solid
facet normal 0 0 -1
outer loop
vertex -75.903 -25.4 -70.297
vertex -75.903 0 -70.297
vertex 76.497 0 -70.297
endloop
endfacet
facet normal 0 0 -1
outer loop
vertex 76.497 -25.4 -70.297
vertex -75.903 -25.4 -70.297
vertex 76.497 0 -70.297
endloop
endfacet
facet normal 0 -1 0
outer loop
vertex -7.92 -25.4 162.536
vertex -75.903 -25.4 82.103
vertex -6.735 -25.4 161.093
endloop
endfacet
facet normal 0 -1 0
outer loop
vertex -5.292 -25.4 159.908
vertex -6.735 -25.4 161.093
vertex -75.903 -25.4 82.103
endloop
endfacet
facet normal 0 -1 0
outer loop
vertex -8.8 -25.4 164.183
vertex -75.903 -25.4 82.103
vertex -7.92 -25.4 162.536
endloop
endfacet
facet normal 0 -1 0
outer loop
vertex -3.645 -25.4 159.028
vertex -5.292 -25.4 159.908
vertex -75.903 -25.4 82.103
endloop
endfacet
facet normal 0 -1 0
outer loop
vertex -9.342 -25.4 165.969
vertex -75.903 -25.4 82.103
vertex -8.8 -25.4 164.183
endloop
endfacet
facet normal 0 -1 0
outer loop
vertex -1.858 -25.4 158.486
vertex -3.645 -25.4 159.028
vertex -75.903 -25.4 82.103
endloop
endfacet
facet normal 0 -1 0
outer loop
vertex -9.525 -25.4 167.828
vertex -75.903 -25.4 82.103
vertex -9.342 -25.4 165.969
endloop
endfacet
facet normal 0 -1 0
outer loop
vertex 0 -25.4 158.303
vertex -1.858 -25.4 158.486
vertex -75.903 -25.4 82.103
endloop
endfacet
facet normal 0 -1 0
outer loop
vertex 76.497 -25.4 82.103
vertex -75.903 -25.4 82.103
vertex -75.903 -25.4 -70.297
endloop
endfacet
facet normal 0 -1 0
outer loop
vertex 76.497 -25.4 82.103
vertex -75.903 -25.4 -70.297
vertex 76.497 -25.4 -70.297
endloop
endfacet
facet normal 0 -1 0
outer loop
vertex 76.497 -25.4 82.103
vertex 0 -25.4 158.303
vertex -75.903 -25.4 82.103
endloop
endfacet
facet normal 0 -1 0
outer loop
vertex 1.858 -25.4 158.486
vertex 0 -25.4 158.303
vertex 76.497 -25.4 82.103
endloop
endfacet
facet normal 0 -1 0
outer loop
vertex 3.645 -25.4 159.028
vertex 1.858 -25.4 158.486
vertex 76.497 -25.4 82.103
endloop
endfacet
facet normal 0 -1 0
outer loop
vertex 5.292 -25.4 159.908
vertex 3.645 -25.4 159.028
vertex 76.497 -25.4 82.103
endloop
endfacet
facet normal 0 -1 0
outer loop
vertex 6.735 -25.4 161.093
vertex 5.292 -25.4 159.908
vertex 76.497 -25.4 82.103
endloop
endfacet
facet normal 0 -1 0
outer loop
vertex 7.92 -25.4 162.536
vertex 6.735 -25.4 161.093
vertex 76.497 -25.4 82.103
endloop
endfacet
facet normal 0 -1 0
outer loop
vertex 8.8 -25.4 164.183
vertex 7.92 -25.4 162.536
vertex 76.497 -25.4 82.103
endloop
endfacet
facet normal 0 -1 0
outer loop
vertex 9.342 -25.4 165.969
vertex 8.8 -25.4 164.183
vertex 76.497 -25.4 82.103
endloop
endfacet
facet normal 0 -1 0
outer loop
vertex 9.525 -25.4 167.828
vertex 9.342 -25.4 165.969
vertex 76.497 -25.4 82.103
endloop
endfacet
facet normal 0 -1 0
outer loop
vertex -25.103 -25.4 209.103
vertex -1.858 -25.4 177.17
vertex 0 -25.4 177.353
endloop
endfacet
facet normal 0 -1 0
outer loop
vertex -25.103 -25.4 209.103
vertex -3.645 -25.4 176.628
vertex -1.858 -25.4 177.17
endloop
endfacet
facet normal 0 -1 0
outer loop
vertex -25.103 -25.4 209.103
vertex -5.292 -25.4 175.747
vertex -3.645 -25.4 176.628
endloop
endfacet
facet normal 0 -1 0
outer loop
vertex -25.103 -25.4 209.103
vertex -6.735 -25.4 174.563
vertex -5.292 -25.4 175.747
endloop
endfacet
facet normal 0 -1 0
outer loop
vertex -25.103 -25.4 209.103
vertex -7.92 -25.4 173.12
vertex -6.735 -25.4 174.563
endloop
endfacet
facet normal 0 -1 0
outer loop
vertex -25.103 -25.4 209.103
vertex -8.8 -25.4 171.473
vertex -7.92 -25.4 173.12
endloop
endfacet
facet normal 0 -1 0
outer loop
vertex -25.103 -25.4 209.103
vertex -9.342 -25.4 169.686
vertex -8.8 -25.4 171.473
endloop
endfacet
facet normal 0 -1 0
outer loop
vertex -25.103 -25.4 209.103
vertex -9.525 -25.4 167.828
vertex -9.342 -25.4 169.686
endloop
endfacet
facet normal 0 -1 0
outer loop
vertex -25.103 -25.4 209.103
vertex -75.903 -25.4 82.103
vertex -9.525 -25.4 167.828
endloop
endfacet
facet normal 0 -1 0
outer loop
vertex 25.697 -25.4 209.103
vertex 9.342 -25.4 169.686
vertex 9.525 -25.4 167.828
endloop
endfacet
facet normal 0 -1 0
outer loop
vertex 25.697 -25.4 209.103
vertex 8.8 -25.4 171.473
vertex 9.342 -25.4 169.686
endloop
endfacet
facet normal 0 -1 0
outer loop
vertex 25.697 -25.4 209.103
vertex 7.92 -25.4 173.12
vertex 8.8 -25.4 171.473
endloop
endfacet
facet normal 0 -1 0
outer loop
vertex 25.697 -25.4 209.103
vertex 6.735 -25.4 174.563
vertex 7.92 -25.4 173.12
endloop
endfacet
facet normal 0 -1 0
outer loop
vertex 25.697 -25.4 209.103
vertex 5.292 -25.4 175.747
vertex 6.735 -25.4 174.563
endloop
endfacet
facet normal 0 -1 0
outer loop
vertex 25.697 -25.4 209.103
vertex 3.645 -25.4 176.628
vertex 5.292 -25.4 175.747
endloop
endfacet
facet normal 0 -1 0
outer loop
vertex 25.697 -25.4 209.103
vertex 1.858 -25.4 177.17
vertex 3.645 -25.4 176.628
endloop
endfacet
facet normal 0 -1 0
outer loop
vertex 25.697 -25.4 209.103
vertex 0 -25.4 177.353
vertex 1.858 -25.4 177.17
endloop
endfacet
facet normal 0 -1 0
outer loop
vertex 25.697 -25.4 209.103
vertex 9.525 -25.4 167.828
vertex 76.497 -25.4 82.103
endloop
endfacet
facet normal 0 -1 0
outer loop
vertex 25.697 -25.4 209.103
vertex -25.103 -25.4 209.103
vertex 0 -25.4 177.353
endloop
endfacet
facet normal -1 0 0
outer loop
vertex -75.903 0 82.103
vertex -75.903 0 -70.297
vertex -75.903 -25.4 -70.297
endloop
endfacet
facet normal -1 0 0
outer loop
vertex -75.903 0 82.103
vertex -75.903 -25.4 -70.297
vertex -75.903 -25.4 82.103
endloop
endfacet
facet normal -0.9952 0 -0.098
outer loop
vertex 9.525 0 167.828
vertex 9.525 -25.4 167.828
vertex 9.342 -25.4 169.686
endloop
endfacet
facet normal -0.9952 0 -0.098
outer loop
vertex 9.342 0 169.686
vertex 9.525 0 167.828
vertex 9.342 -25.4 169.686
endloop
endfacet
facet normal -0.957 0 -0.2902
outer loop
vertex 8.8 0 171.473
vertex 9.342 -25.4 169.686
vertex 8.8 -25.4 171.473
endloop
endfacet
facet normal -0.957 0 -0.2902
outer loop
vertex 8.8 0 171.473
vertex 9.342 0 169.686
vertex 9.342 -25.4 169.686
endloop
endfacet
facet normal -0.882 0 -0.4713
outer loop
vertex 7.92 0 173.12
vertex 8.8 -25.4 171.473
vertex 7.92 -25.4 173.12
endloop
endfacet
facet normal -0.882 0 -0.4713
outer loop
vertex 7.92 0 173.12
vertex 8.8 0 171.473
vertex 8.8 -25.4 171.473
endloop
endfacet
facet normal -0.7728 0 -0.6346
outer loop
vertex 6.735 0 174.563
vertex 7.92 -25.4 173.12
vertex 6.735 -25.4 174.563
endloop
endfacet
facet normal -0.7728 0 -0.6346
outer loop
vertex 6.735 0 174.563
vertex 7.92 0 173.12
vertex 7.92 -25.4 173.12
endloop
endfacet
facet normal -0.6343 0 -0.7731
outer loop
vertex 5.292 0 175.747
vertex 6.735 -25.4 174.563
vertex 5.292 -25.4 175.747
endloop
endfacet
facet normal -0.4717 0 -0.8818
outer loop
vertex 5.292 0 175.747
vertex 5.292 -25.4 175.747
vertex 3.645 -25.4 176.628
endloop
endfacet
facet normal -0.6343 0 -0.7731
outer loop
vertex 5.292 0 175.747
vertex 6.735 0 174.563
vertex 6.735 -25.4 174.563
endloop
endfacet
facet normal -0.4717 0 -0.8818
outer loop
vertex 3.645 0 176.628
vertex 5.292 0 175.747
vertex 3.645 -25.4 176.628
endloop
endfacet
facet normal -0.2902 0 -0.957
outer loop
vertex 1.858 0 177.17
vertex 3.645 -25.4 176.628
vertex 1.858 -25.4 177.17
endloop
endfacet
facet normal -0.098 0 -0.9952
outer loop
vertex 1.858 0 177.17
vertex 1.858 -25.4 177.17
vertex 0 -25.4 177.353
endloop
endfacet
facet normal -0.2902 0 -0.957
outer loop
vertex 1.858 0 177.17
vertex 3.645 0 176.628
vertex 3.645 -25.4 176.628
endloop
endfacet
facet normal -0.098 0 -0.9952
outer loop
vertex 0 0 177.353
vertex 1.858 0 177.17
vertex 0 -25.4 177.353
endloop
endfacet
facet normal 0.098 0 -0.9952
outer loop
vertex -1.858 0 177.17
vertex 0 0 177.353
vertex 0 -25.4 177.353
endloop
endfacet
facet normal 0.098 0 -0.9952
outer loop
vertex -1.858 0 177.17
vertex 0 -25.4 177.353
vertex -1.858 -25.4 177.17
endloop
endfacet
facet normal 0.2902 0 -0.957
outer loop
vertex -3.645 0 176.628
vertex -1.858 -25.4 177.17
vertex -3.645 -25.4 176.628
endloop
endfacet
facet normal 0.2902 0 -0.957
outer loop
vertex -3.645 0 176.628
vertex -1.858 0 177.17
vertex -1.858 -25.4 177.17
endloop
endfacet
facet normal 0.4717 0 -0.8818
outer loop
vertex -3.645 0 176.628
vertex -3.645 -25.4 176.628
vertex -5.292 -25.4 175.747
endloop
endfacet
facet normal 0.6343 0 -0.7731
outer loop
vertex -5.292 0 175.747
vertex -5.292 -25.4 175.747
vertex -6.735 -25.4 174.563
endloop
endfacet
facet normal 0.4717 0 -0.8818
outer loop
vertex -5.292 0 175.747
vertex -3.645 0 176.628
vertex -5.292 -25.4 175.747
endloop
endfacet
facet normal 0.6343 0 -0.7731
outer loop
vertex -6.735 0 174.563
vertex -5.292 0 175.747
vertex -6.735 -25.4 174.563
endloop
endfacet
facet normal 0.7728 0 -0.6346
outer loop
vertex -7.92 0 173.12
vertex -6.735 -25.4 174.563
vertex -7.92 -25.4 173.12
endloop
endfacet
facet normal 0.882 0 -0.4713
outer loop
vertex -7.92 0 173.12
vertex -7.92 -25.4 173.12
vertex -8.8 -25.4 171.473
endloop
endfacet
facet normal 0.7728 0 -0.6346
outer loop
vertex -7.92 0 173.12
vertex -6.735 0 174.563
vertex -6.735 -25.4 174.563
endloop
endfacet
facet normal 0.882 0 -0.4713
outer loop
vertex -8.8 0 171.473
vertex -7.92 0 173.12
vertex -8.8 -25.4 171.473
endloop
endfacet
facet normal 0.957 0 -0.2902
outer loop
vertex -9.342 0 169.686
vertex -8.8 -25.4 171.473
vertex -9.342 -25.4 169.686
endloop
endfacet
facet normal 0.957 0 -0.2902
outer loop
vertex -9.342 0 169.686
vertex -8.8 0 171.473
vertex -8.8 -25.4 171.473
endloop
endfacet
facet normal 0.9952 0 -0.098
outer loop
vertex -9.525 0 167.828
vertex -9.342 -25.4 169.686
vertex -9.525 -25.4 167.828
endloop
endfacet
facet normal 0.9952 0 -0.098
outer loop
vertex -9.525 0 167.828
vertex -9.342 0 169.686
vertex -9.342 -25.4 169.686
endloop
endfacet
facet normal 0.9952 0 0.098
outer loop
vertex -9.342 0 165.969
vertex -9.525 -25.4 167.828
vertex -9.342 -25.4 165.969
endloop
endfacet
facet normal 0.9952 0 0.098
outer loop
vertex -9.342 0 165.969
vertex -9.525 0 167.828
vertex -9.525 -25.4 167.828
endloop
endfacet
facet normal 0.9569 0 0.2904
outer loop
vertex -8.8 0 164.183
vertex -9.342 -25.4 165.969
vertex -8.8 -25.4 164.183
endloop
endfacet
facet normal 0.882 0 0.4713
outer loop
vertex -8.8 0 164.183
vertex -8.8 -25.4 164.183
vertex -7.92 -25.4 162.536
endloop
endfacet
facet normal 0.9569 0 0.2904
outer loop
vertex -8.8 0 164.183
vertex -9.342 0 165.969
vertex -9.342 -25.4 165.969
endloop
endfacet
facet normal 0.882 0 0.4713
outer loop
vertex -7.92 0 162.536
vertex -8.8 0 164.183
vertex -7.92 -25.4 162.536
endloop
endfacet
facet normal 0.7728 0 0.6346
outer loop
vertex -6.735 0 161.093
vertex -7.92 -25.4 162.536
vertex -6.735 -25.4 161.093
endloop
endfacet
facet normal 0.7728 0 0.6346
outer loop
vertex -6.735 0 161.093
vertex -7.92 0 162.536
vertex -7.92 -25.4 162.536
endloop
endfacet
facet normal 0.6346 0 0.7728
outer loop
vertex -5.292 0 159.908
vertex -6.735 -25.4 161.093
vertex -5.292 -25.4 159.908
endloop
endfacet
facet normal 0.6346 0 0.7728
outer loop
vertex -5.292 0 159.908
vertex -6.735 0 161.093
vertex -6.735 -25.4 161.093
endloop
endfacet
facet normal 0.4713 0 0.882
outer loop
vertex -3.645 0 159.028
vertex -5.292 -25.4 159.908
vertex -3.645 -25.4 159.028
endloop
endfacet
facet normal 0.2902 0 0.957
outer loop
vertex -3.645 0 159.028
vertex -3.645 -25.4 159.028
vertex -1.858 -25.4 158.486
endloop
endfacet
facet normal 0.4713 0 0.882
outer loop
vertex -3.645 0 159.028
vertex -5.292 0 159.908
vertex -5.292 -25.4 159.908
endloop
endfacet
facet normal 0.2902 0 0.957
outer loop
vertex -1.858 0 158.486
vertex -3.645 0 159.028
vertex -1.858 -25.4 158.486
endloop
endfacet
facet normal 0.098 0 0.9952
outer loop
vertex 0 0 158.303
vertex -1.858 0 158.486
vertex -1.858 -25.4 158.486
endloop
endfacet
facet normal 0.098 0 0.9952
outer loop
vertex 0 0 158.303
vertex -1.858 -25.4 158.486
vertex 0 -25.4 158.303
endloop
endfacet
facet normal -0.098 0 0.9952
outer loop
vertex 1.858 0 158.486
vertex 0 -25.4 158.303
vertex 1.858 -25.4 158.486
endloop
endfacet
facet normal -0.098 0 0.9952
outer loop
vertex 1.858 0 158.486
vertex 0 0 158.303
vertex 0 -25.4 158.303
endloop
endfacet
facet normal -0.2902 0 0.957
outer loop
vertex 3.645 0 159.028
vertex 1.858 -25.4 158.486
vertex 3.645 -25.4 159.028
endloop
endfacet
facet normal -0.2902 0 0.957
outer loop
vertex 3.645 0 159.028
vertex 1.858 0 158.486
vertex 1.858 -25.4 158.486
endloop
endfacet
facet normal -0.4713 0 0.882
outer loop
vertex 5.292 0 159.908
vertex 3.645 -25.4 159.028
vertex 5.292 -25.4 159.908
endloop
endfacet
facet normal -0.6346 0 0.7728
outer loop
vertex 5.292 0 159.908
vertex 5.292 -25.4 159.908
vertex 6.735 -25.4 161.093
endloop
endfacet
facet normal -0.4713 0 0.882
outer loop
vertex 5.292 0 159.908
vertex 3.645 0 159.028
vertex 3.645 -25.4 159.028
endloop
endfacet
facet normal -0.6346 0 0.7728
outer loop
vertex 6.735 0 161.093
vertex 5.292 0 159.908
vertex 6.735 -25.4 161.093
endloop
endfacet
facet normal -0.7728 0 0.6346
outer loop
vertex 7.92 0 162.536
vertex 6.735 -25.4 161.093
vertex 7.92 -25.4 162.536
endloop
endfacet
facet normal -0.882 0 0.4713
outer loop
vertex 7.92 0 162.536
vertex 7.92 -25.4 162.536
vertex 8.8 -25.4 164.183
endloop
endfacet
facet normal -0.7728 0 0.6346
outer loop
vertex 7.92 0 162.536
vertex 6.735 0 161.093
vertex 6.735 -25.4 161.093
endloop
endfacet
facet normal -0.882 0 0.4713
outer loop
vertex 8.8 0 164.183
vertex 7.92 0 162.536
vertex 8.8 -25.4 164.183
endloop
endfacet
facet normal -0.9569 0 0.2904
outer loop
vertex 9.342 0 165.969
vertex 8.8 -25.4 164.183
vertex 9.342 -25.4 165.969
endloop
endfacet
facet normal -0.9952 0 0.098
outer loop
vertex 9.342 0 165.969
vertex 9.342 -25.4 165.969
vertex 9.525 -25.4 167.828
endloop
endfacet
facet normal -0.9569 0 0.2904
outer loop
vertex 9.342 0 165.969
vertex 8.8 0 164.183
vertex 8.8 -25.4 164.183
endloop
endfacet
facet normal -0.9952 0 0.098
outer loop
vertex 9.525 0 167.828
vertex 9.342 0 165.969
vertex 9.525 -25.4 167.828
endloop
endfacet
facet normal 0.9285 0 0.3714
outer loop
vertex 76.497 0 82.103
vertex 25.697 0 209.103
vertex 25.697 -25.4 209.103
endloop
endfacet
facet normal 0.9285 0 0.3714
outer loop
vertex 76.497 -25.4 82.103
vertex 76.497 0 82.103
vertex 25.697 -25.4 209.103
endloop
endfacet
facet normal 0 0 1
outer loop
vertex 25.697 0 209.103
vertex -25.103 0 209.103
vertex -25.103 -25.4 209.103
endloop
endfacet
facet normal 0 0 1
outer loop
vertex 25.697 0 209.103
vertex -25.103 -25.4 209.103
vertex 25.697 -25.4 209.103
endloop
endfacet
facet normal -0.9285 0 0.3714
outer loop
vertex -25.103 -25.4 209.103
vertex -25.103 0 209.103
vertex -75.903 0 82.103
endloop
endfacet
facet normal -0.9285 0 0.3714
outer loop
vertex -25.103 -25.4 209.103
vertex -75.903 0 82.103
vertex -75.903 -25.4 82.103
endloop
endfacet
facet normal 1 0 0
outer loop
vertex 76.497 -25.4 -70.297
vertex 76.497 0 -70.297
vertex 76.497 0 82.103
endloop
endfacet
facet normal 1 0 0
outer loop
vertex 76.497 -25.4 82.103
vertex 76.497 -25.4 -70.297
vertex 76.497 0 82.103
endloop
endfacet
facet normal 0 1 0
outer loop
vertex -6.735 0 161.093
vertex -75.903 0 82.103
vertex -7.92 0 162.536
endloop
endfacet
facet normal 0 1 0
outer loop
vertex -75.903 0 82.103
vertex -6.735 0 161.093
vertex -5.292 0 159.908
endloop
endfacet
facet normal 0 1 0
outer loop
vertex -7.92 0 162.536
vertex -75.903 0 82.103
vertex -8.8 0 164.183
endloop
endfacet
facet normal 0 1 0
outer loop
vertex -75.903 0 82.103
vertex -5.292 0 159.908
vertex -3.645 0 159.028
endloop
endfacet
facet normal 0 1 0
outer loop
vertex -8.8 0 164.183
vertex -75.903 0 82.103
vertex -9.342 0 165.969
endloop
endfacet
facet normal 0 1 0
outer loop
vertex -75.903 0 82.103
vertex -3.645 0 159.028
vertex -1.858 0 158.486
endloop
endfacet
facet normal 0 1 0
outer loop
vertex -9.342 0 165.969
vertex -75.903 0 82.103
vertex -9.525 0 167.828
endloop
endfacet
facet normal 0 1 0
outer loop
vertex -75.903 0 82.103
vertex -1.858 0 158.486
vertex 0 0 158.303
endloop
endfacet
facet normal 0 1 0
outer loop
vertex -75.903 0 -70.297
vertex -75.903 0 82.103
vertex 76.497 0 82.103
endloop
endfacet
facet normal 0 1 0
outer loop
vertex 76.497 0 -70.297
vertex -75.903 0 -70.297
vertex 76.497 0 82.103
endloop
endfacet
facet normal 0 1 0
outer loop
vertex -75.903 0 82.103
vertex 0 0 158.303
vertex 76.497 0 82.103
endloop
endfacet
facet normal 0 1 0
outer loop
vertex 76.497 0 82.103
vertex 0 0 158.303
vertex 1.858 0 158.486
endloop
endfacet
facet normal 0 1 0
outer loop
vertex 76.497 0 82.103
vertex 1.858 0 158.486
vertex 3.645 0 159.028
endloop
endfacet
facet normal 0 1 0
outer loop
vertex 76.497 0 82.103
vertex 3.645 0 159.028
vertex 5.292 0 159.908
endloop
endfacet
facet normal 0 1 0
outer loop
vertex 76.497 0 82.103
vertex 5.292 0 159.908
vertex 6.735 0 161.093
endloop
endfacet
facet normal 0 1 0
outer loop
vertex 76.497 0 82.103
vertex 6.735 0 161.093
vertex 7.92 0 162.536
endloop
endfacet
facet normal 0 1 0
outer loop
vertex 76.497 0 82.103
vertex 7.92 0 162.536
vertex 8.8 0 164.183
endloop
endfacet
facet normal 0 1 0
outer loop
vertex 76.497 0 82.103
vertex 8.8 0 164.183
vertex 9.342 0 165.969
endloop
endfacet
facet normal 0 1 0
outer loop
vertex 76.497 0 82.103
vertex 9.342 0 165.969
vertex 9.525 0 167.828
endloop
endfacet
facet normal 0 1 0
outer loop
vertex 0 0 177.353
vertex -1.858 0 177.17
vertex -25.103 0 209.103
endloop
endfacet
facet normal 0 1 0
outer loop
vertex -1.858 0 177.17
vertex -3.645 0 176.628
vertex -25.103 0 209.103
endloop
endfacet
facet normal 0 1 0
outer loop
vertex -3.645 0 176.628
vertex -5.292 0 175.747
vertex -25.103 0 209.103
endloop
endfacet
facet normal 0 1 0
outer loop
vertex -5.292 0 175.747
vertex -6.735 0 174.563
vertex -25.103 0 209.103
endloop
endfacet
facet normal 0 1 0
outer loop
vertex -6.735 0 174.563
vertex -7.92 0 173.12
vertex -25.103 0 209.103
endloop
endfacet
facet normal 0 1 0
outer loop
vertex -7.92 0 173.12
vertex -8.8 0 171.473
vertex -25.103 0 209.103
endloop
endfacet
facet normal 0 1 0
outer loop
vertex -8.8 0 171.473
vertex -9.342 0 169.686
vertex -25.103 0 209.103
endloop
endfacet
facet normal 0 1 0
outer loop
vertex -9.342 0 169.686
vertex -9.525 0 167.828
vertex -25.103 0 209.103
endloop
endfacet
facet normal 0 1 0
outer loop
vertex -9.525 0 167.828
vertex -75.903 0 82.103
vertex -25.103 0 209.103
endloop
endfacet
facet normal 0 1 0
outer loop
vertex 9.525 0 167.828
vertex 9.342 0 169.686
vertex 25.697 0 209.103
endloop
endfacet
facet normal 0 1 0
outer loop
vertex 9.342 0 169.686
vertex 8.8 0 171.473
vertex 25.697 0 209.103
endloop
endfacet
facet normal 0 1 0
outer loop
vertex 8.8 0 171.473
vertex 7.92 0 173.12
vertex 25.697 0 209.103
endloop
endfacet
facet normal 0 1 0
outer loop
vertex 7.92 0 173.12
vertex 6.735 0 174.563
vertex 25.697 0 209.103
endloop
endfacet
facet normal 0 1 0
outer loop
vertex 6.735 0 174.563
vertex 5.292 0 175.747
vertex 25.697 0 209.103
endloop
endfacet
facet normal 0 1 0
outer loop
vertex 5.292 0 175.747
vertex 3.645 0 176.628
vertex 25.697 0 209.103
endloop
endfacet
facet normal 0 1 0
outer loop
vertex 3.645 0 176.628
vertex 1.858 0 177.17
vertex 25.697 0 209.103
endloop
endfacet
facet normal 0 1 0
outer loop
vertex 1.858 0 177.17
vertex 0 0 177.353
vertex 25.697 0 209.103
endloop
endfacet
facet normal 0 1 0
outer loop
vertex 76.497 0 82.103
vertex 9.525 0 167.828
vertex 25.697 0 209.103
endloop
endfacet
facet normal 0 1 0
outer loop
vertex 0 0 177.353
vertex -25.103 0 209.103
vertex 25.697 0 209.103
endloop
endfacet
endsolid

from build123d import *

# Parameters (mm, degrees)
F0_W       = 152.4
F0_H       = 279.4
F0_R       = 9.525
F1_DEPTH   = 25.4
F2_SIZE2   = 50.8
F2_SIZE    = 127
F2_2_SIZE2 = 50.8
F2_2_SIZE  = 127


with BuildPart() as f1:
    # F0 (on Front) → F1 (new body)
    with BuildSketch(Plane.XZ):
        with Locations((0.297114253, 69.4026991844)):
            Rectangle(F0_W, F0_H)
        with Locations((0, 167.8276991844)):
            Circle(F0_R, mode=Mode.SUBTRACT)
    extrude(amount=F1_DEPTH)

    # F2
    f2_edges = [f1.edges().sort_by_distance(p)[0] for p in [
        (-75.902886, -12.7, 209.102699),
    ]]
    f2_side = f1.faces().sort_by_distance((-75.902886, -12.7, 69.402699))[0]
    chamfer(f2_edges, length=F2_SIZE, length2=F2_SIZE2, reference=f2_side)

    # F2#2
    f2_2_edges = [f1.edges().sort_by_distance(p)[0] for p in [
        (76.497114, -12.7, 209.102699),
    ]]
    f2_2_side = f1.faces().sort_by_distance((76.497114, -12.7, 69.402699))[0]
    chamfer(f2_2_edges, length=F2_2_SIZE, length2=F2_2_SIZE2, reference=f2_2_side)


solid = f1.part
